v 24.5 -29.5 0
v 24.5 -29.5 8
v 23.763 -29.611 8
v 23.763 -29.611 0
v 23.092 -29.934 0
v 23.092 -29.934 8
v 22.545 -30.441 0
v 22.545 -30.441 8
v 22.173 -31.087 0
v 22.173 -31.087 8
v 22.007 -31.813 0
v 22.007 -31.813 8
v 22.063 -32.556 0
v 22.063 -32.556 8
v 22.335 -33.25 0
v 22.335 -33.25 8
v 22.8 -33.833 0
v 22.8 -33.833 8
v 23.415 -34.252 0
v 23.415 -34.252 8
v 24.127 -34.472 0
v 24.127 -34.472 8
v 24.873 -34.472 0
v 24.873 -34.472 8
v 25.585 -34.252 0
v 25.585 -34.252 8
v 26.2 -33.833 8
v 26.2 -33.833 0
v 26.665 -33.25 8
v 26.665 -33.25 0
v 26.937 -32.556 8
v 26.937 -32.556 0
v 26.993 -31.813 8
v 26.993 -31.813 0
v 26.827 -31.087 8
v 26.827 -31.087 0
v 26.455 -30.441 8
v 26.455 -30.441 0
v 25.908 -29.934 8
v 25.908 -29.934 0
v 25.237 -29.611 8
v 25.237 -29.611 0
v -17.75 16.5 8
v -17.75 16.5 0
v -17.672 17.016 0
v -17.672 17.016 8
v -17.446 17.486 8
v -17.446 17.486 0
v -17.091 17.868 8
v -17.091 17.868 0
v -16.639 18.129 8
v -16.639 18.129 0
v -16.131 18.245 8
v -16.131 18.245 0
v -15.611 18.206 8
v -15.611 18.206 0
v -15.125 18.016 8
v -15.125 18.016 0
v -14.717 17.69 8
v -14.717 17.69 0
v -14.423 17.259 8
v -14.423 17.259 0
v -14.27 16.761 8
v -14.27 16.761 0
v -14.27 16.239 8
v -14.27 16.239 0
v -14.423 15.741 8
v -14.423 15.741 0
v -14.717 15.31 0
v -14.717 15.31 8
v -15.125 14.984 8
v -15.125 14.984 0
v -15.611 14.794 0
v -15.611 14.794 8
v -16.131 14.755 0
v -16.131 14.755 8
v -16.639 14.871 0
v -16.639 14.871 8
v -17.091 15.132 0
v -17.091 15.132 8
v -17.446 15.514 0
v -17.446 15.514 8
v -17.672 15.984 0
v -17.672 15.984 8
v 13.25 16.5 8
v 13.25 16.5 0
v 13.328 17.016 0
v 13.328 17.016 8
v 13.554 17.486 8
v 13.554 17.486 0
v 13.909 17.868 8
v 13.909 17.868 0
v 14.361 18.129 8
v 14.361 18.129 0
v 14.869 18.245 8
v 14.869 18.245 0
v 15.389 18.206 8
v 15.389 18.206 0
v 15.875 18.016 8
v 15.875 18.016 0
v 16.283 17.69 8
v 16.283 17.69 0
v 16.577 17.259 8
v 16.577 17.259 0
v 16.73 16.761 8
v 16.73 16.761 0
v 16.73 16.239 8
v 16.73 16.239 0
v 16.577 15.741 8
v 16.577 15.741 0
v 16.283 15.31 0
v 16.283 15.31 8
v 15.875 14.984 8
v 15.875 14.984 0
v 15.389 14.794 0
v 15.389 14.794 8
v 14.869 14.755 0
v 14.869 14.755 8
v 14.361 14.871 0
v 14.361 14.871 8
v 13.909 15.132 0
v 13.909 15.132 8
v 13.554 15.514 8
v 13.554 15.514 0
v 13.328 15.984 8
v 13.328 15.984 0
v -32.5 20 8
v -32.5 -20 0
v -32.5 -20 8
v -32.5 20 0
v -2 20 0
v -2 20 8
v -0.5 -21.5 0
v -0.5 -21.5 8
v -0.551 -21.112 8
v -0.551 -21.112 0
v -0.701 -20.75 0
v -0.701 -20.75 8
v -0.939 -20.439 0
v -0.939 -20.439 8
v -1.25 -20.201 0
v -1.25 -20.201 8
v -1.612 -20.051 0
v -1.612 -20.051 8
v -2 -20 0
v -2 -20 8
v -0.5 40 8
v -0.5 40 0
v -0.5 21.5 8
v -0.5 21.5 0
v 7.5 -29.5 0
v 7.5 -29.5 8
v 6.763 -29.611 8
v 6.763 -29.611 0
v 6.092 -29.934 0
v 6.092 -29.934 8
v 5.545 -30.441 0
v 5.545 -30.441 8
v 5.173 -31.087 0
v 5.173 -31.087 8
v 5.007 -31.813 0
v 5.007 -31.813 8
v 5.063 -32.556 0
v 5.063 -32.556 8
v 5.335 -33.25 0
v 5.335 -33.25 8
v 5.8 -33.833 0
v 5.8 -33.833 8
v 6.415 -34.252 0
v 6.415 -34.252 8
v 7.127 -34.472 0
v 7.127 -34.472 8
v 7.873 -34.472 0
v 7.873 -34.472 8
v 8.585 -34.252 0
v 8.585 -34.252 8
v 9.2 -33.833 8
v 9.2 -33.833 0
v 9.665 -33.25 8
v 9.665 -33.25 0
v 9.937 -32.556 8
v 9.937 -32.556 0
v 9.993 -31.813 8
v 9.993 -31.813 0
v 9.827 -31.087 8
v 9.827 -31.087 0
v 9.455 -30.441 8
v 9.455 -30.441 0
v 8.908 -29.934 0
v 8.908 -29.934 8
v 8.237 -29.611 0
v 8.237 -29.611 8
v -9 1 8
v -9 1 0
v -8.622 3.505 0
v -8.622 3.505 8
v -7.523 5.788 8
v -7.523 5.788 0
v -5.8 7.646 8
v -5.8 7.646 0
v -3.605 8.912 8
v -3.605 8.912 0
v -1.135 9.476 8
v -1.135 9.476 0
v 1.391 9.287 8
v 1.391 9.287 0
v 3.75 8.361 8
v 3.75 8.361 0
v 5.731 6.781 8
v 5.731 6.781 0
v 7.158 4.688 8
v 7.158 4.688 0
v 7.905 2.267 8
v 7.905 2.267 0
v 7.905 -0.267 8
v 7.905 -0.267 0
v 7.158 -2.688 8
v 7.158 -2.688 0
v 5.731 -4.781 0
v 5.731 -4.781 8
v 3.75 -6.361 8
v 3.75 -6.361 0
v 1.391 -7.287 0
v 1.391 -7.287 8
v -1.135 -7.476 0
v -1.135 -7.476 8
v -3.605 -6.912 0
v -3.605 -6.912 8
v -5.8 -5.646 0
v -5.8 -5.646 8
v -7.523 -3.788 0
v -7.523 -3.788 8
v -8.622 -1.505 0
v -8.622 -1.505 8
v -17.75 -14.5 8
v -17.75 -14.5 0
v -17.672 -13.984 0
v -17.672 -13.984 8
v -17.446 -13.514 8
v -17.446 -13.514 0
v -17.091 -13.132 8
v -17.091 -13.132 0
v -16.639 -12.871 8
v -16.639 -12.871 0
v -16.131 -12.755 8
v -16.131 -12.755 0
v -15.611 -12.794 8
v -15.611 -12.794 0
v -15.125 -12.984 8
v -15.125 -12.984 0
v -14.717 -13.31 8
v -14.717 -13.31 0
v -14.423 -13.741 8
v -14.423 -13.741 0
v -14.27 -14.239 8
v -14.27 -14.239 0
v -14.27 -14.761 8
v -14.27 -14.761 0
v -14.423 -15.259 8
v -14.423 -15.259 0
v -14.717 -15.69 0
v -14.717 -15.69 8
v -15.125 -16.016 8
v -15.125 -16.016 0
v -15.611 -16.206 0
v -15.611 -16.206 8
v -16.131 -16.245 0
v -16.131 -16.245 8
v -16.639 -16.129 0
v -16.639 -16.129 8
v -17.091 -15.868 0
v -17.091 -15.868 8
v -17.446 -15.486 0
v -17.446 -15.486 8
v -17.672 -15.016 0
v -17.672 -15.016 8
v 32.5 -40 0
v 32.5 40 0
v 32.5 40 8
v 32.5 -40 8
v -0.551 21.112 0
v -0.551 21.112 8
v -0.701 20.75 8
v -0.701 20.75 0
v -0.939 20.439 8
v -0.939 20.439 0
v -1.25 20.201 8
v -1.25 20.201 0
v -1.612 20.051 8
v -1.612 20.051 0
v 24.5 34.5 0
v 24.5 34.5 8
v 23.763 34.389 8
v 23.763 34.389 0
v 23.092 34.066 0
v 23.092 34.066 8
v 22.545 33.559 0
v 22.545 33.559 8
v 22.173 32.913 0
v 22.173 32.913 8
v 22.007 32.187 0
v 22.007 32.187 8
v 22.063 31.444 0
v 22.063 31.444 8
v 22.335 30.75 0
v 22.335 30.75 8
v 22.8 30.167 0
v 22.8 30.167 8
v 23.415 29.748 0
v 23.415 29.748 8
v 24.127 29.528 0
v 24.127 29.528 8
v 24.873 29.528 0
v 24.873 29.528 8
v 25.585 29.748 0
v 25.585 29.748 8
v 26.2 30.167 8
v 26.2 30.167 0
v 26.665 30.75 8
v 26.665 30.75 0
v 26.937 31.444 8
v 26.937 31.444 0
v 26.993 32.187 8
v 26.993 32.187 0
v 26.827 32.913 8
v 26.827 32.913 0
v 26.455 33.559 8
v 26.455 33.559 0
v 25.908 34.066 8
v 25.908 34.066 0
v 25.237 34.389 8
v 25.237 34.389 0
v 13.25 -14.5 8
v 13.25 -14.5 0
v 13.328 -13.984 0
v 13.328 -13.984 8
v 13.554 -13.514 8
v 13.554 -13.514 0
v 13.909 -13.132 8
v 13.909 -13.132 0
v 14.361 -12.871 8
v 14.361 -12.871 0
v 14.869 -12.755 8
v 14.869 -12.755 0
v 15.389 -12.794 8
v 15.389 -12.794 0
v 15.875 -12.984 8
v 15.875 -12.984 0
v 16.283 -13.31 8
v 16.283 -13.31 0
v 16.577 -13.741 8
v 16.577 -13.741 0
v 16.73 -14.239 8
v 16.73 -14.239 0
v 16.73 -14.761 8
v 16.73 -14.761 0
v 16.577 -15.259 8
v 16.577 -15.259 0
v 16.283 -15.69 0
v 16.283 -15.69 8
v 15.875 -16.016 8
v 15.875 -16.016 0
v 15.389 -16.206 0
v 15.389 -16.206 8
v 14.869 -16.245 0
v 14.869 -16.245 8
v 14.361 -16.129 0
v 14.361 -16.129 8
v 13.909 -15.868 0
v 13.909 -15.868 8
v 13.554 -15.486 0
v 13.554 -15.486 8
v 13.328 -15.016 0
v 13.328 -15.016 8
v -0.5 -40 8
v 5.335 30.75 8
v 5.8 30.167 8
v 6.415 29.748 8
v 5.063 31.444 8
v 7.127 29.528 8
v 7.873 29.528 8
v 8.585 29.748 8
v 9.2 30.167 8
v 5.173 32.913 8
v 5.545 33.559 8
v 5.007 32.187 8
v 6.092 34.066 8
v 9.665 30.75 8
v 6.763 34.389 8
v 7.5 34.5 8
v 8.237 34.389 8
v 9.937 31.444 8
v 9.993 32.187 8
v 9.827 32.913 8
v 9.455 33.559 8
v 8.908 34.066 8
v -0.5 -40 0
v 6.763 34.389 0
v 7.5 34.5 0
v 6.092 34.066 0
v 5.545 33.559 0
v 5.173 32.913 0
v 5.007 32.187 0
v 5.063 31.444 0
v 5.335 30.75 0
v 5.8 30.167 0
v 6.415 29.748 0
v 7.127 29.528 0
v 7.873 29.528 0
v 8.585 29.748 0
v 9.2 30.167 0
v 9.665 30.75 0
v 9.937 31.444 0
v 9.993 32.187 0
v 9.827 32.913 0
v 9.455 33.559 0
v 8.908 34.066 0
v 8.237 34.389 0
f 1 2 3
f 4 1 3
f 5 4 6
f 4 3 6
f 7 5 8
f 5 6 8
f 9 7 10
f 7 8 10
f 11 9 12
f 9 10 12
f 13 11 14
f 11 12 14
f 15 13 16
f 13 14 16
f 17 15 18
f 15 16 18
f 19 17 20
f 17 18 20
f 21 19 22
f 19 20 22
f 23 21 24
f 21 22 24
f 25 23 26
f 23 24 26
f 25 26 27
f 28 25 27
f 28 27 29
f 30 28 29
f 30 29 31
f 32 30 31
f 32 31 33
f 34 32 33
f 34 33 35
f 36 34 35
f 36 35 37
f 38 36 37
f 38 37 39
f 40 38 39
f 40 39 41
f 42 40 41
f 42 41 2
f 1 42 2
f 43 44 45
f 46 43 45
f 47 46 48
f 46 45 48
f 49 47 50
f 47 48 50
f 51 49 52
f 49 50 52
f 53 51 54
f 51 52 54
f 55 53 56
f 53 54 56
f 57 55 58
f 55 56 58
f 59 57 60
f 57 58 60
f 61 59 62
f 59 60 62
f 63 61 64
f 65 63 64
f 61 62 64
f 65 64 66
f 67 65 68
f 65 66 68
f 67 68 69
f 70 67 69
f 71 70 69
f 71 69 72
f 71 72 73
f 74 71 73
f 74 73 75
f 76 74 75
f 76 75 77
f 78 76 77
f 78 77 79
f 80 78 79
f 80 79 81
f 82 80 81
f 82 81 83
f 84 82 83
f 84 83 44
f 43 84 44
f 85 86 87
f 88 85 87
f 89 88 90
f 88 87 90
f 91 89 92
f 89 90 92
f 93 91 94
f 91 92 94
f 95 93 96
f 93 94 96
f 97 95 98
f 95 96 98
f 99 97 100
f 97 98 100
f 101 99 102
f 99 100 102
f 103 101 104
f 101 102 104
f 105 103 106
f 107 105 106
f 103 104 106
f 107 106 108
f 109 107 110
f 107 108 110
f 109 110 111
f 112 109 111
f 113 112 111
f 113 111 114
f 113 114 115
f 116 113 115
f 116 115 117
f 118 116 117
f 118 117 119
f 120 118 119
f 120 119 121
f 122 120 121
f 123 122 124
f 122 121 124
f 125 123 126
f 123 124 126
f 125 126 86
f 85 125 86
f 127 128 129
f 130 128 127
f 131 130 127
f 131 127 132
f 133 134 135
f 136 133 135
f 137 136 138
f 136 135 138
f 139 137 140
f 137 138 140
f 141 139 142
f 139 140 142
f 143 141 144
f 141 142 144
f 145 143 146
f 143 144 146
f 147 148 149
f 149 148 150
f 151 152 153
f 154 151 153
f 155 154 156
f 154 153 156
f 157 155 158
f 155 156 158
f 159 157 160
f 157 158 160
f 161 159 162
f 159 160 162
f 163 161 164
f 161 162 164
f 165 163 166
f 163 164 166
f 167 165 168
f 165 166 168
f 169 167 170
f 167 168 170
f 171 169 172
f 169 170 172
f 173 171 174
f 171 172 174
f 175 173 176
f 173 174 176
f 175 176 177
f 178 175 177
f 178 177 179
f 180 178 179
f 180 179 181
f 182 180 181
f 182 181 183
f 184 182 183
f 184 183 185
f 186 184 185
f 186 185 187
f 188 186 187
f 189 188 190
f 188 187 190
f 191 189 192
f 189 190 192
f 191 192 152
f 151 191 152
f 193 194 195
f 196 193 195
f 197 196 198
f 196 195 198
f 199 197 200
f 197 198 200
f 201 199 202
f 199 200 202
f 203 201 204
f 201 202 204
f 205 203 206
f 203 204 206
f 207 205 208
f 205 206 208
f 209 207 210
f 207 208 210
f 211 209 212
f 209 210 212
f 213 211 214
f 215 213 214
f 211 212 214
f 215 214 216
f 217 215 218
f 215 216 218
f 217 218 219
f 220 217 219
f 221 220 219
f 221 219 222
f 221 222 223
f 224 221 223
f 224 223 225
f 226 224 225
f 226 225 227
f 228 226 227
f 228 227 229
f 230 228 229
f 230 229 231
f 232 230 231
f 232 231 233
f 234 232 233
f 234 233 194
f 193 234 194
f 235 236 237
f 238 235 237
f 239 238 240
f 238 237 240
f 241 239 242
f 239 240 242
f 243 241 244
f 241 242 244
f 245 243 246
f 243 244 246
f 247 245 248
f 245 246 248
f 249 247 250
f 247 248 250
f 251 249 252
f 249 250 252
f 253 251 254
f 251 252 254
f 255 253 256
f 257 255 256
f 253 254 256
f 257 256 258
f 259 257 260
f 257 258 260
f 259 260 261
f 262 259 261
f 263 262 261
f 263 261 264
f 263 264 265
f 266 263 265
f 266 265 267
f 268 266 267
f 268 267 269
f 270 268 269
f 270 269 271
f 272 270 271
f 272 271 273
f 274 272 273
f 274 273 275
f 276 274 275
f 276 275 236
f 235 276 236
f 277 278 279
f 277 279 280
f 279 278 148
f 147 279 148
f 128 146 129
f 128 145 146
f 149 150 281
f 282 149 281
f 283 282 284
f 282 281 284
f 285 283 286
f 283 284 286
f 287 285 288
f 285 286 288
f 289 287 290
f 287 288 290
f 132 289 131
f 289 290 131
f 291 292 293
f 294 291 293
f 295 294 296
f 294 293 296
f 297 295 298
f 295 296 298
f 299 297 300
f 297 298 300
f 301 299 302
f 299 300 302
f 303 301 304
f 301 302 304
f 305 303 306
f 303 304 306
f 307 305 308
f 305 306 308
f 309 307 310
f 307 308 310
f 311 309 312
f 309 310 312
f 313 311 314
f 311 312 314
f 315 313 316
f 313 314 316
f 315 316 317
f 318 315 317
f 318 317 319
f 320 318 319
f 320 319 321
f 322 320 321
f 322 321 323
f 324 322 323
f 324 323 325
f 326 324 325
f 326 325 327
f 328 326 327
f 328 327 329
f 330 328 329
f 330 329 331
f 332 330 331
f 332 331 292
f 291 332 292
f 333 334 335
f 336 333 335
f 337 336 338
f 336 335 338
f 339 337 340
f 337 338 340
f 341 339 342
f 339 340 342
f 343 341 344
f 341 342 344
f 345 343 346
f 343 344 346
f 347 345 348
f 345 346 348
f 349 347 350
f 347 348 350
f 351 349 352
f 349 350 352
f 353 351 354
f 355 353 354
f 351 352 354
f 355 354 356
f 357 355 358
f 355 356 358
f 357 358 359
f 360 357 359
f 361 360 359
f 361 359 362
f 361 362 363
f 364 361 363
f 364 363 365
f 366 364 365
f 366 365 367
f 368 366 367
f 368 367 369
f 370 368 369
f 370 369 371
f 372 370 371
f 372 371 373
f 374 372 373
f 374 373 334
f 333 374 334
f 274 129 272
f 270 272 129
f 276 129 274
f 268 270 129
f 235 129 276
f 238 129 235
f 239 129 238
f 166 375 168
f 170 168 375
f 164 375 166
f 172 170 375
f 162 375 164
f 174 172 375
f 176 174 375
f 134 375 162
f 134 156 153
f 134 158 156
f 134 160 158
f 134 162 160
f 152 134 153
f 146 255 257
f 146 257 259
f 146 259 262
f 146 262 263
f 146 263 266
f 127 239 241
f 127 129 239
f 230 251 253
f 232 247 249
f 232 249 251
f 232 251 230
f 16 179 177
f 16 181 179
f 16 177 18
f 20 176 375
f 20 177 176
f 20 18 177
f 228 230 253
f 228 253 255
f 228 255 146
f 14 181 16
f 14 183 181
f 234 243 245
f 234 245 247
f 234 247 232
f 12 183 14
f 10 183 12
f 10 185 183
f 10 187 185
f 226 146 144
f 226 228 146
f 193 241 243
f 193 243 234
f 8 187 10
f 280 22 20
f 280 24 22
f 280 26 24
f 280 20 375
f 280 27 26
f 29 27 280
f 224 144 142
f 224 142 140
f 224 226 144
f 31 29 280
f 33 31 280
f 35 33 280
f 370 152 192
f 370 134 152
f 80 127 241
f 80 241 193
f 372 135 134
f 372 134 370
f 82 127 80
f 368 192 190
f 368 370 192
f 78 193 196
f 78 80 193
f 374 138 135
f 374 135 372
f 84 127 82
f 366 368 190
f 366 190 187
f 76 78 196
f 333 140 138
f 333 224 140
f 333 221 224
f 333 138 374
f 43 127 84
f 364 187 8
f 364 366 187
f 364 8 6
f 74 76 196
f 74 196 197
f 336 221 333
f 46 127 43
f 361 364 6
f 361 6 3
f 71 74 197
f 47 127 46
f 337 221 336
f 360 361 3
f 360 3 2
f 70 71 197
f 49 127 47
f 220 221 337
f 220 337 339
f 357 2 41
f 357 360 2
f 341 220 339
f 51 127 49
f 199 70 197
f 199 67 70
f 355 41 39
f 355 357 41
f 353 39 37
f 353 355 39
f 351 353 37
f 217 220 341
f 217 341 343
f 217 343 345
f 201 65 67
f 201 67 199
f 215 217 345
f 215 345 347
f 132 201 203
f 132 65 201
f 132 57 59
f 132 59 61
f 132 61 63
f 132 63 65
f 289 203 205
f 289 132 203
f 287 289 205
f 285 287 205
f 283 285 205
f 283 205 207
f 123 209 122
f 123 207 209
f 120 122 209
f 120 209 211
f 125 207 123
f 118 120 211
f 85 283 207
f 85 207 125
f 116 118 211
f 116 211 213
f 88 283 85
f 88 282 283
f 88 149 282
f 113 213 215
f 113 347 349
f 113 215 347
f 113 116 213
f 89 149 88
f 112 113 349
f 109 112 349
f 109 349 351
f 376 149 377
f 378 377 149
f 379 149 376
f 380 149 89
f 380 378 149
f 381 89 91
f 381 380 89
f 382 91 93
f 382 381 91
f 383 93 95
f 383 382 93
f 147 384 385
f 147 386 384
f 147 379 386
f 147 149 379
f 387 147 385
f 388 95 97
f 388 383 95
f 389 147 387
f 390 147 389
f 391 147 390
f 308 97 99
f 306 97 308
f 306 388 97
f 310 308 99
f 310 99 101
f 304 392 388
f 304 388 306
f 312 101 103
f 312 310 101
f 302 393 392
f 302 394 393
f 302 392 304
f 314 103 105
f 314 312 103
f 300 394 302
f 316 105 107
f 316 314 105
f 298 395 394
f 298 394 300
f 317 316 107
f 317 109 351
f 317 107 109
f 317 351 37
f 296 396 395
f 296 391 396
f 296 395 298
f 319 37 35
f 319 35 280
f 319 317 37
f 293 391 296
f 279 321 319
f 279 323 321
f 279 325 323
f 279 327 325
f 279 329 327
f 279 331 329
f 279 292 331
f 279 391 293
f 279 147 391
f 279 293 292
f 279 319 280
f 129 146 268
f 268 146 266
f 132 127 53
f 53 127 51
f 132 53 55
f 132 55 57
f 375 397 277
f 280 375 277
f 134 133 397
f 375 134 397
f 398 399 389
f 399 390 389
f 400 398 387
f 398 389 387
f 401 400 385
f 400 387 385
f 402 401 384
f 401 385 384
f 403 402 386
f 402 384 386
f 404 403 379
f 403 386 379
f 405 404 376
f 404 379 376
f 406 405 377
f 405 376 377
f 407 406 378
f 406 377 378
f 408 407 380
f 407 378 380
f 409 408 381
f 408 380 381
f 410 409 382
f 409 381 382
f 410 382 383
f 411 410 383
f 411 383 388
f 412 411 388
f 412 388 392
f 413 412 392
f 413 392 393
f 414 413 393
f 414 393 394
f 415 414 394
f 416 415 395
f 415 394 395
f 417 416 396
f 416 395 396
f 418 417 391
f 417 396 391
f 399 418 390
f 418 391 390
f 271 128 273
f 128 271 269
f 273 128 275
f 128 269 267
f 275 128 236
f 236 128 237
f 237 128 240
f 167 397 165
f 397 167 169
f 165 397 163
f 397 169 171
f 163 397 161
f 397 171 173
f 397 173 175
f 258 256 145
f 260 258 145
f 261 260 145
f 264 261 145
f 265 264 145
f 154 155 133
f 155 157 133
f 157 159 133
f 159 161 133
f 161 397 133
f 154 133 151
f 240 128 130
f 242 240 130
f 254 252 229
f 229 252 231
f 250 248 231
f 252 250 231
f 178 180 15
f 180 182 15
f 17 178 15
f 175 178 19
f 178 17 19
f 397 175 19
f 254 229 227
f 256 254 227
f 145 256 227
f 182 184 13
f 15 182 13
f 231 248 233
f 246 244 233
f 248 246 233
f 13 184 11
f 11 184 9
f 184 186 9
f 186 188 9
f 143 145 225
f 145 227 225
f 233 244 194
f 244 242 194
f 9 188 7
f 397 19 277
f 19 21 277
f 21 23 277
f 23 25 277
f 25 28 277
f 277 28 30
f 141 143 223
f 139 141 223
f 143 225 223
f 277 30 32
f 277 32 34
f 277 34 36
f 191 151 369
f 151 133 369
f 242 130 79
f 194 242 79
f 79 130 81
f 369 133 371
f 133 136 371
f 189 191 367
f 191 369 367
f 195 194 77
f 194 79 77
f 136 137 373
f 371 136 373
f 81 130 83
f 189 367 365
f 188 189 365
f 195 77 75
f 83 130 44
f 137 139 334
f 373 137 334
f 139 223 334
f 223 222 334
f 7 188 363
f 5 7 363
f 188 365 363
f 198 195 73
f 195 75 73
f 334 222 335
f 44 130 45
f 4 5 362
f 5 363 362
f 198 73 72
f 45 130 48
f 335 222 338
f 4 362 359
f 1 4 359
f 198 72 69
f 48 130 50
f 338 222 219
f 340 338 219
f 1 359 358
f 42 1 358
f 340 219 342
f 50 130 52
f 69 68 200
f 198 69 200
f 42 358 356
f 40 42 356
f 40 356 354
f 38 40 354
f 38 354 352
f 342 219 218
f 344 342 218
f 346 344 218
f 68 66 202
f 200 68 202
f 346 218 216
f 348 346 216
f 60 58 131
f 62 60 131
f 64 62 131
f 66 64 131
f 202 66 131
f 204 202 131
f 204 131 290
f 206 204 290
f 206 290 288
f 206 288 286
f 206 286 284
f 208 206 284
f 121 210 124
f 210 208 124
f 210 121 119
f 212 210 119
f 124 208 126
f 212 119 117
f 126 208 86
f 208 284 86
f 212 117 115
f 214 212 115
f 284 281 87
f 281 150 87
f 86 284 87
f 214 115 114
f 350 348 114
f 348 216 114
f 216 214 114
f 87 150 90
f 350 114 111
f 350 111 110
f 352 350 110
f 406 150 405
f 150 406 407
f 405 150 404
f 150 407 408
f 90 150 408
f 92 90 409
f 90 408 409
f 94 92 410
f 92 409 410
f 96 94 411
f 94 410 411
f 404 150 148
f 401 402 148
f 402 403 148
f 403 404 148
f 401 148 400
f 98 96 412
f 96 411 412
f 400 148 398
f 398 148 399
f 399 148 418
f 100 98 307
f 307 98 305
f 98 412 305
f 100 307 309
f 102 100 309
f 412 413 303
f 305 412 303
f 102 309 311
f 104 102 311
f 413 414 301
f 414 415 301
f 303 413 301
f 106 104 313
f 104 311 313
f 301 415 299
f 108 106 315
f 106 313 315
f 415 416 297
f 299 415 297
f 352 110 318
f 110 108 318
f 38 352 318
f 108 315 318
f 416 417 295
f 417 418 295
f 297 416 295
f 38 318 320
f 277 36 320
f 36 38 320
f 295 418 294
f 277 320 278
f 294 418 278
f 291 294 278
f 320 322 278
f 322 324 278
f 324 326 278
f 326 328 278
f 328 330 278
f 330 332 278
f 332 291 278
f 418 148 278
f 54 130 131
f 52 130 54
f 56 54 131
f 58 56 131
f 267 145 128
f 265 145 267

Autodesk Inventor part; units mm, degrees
ref_plane "YZ Plane" through (0, 0, 0) normal (1, 0, 0) x (0, 1, 0)
ref_plane "XZ Plane" through (0, 0, 0) normal (0, 1, 0) x (-1, 0, 0)
ref_plane "XY Plane" through (0, 0, 0) normal (0, 0, 1) x (1, 0, 0)
sketch "Sketch1" plane through (0, 0, 0) normal (0, 0, 1) x (1, 0, 0)
  line L0 (-32.5, 20) -> (32.5, 20)
  line L1 (32.5, 20) -> (32.5, -20)
  line L2 (32.5, -20) -> (-32.5, -20)
  line L3 (-32.5, -20) -> (-32.5, 20)
  point P0 (0, 0)
  point P1 (0, 20)
  point P2 (-32.5, 0)
  dimension "d0" = 65
  dimension "d1" = 40
extrude "Extrusion1" add sketch "Sketch1" along normal blind 8
sketch "Sketch5" plane through (0, 0, 0) normal (0, 0, -1) x (-1, 0, 0)
  line L0 (-32.5, 40) -> (0.5, 40)
  line L1 (0.5, 40) -> (0.5, -40)
  line L2 (0.5, -40) -> (-32.5, -40)
  line L3 (-32.5, -40) -> (-32.5, 40)
  line L4 (-32.5, -20) -> (-32.5, 20) projected
  line L5 (-32.5, 20) -> (32.5, 20) projected
  line L6 (32.5, -20) -> (-32.5, -20) projected
  point P0 (0, 0)
  dimension "d22" = 20
  dimension "d23" = 20
  dimension "d24" = 33
extrude "Extrusion5" add sketch "Sketch5" against normal up to surface (8 mm away)
sketch "Sketch6" plane through (0, 0, 0) normal (0, 0, -1) x (-1, 0, 0)
  line L0 (0.5, 40) -> (-32.5, 40) projected
  line L1 (-32.5, 40) -> (-32.5, -40) projected
  line L2 (-15, 16.5) -> (16, 16.5) construction
  line L3 (16, 16.5) -> (16, -14.5) construction
  line L4 (16, -14.5) -> (-15, -14.5) construction
  line L5 (-15, -14.5) -> (-15, 16.5) construction
  line L6 (-15, 16.5) -> (16, -14.5) construction
  line L7 (16, 16.5) -> (-15, -14.5) construction
  circle A0 centre (-15, 16.5) radius 1.75
  circle A1 centre (16, 16.5) radius 1.75
  circle A2 centre (16, -14.5) radius 1.75
  circle A3 centre (-15, -14.5) radius 1.75
  circle A4 centre (0.5, 1) radius 8.5
  dimension "d29" = 31
  dimension "d30" = 33
  dimension "d31" = 39
  dimension "d32" = 3.5
  dimension "d33" = 17
extrude "Extrusion6" cut sketch "Sketch6" against normal blind 10
sketch "Sketch7" plane through (0, 0, 0) normal (0, 0, -1) x (-1, 0, 0)
  line L0 (-32.5, 40) -> (-32.5, -40) projected
  line L1 (0.5, 40) -> (-32.5, 40) projected
  line L2 (0.5, 20) -> (0.5, 40) projected
  line L3 (-32.5, -40) -> (0.5, -40) projected
  point P0 (0, 0)
  point P1 (-24.5, 32)
  point P2 (-7.5, 32)
  point P3 (-24.5, -32)
  point P4 (-7.5, -32)
  dimension "d36" = 8
  dimension "d37" = 8
  dimension "d38" = 8
  dimension "d39" = 17
  dimension "d40" = 8
  dimension "d41" = 64
hole "Hole1" at (24.5, 32, 0) direction (0, 0, 1) diameter 5 end through all
pattern_linear "Rectangular Pattern1" count 2 spacing 64 along (0, -1, 0) count 2 spacing 17 along (-1, 0, 0) of "Hole1"
fillet "Fillet1" radius 1.5 2 edges at (-0.5, -20, 4) (-0.5, 20, 4)
equation "\"d23\" = d22"
equation "\"d38\" = d36"
equation "\"d40\" = d37"
properties part number "0005-10-023 Suport motor x" material "Wood (Maple)"
